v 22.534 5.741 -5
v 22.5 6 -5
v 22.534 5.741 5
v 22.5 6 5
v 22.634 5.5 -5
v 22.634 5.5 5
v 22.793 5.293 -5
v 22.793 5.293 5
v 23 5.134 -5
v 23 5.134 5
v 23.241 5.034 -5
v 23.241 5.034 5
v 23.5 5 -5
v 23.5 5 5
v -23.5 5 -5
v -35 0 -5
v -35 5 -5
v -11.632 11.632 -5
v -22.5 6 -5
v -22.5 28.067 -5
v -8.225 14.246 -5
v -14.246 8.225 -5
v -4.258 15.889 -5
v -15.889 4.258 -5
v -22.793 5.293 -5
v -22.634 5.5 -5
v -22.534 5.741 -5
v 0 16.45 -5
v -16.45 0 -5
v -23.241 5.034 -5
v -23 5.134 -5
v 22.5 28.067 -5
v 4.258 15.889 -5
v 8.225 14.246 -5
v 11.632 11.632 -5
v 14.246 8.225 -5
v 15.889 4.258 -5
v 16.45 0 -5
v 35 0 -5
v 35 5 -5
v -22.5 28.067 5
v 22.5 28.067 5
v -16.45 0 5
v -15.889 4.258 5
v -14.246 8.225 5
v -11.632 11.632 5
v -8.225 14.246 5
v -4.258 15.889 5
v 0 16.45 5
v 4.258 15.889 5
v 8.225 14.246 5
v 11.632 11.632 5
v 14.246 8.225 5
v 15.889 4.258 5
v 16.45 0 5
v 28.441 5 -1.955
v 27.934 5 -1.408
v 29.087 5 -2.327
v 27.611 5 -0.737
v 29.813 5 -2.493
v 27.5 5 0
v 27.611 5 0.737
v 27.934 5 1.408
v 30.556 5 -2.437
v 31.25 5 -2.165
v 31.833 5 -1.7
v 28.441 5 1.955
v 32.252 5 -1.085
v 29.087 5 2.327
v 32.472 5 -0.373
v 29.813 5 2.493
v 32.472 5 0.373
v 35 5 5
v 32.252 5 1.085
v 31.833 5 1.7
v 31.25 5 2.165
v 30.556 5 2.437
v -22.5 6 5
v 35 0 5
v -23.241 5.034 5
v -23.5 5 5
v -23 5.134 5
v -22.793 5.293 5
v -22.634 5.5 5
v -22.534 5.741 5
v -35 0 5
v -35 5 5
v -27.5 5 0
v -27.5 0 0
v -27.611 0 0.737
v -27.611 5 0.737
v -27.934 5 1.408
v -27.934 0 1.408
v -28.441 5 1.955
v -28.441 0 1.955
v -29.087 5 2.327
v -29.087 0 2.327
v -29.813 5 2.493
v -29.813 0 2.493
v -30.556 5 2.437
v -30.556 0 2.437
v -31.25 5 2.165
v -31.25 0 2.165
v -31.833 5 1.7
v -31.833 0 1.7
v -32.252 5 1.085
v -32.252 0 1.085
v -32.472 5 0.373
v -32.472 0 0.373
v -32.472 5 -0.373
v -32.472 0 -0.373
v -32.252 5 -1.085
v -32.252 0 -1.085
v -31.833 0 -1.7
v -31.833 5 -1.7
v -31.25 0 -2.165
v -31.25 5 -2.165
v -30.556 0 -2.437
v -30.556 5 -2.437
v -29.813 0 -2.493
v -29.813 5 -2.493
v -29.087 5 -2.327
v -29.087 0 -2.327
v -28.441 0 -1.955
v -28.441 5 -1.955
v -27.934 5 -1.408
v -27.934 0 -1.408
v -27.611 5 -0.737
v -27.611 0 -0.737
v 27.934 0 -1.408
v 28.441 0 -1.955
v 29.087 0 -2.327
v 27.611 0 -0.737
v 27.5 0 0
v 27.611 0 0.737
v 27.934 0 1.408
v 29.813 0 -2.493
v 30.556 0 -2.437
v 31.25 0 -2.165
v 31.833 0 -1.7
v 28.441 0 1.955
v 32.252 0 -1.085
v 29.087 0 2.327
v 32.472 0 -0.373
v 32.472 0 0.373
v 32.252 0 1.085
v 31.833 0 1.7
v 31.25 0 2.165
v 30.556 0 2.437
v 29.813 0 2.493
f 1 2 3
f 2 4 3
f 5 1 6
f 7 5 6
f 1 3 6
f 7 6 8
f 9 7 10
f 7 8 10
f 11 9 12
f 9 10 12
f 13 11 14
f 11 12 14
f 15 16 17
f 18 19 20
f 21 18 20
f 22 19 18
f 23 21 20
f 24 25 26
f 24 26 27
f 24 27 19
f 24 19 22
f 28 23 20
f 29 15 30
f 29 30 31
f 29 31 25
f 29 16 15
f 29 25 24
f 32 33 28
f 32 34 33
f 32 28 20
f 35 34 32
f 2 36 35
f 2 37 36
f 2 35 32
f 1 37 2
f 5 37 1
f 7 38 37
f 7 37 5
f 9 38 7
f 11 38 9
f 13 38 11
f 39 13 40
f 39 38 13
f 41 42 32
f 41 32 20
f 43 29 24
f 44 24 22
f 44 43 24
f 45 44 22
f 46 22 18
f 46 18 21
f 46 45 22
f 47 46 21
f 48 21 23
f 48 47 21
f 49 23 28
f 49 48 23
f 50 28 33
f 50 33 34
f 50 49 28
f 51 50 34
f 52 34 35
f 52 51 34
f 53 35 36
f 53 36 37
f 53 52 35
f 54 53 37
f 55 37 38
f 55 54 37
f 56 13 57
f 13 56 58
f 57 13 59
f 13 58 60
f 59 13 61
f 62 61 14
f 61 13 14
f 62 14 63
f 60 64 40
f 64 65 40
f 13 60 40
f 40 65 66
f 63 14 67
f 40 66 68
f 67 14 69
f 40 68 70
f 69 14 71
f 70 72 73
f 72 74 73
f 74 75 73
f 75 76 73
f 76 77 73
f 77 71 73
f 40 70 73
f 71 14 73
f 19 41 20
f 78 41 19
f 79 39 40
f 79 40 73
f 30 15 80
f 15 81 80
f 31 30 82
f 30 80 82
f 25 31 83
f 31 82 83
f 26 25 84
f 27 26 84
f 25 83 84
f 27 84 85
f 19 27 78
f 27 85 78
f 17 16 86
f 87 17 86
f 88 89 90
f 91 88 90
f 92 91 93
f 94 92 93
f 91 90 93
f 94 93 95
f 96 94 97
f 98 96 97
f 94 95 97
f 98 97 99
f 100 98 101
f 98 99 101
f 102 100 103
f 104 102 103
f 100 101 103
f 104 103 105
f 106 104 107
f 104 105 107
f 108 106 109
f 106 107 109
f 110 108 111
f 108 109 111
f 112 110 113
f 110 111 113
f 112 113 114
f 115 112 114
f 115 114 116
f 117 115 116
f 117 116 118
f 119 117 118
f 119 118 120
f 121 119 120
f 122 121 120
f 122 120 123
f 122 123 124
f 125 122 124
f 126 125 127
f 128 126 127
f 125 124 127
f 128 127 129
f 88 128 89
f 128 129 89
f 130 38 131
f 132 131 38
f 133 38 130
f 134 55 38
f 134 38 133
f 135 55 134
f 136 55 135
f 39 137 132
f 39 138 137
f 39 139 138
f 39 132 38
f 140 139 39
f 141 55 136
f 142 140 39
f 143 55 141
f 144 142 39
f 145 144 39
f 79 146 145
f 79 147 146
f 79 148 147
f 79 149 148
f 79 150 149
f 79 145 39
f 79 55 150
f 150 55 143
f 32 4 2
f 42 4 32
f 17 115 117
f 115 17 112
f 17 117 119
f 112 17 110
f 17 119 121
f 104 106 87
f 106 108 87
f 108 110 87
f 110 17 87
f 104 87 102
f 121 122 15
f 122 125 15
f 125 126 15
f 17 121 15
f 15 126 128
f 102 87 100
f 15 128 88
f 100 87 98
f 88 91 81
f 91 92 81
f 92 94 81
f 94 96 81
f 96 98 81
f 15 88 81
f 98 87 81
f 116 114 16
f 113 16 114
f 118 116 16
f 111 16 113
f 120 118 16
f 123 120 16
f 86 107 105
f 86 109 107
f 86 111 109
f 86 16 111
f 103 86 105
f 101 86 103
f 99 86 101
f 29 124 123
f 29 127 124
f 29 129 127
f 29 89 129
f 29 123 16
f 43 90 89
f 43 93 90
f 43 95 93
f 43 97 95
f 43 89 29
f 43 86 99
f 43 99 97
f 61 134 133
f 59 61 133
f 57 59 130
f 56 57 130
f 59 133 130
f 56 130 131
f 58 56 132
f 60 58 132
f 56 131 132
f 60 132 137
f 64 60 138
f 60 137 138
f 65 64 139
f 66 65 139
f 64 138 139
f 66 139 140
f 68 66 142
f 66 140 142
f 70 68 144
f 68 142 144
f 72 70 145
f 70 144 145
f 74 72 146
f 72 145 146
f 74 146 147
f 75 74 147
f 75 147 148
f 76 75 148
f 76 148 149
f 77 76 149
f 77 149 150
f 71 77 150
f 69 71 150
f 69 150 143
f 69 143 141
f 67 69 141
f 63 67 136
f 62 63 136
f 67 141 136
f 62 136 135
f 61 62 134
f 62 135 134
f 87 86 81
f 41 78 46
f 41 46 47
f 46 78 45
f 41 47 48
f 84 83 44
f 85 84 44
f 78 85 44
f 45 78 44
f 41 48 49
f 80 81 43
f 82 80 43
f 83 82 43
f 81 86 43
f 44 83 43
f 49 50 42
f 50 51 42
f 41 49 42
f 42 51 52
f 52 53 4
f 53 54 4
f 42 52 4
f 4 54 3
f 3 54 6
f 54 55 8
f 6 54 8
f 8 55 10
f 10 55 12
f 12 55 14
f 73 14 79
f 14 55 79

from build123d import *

# Parameters (mm, degrees)
EXTRUDE_1_DEPTH = 5
SKETCH_2_W      = 12.5
SKETCH_2_H      = 10
SKETCH_2_R      = 2.5
EXTRUDE_2_DEPTH = 5
FILLET_1_R      = 1


with BuildPart() as part:
    # 草图1 → 凸台-拉伸1 (new, symmetric)
    with BuildSketch(Plane.XY):
        with BuildLine():
            Line((16.45, 0), (22.5, 0))
            Line((22.5, 0), (22.5, 28.066706708))
            Line((22.5, 28.066706708), (-22.5, 28.066706708))
            Line((-22.5, 28.066706708), (-22.5, 0))
            Line((-22.5, 0), (-16.45, 0))
            ThreePointArc((-16.45, 0), (0, 16.45), (16.45, 0))
        make_face()
    extrude(amount=EXTRUDE_1_DEPTH, both=True)

    # 草图2 → 凸台-拉伸2 (add)
    # profile 1 of 2: a face of its own
    with BuildSketch(Plane.XZ):
        with Locations((-28.75, 0)):
            Rectangle(SKETCH_2_W, SKETCH_2_H)
        with Locations((-30, 0)):
            Circle(SKETCH_2_R, mode=Mode.SUBTRACT)
    # profile 2 of 2: a face of its own
    with BuildSketch(Plane.XZ):
        with Locations((28.75, 0)):
            Rectangle(SKETCH_2_W, SKETCH_2_H)
        with Locations(Location((30, 0, 0), (0, 0, 180))):
            Circle(SKETCH_2_R, mode=Mode.SUBTRACT)
    extrude(amount=-EXTRUDE_2_DEPTH)

    # 圆角1
    fillet_1_edges = [part.edges().sort_by_distance(p)[0] for p in [
        (22.5, 5, 0),
        (-22.5, 5, 0),
    ]]
    fillet(fillet_1_edges, radius=FILLET_1_R)


solid = part.part
